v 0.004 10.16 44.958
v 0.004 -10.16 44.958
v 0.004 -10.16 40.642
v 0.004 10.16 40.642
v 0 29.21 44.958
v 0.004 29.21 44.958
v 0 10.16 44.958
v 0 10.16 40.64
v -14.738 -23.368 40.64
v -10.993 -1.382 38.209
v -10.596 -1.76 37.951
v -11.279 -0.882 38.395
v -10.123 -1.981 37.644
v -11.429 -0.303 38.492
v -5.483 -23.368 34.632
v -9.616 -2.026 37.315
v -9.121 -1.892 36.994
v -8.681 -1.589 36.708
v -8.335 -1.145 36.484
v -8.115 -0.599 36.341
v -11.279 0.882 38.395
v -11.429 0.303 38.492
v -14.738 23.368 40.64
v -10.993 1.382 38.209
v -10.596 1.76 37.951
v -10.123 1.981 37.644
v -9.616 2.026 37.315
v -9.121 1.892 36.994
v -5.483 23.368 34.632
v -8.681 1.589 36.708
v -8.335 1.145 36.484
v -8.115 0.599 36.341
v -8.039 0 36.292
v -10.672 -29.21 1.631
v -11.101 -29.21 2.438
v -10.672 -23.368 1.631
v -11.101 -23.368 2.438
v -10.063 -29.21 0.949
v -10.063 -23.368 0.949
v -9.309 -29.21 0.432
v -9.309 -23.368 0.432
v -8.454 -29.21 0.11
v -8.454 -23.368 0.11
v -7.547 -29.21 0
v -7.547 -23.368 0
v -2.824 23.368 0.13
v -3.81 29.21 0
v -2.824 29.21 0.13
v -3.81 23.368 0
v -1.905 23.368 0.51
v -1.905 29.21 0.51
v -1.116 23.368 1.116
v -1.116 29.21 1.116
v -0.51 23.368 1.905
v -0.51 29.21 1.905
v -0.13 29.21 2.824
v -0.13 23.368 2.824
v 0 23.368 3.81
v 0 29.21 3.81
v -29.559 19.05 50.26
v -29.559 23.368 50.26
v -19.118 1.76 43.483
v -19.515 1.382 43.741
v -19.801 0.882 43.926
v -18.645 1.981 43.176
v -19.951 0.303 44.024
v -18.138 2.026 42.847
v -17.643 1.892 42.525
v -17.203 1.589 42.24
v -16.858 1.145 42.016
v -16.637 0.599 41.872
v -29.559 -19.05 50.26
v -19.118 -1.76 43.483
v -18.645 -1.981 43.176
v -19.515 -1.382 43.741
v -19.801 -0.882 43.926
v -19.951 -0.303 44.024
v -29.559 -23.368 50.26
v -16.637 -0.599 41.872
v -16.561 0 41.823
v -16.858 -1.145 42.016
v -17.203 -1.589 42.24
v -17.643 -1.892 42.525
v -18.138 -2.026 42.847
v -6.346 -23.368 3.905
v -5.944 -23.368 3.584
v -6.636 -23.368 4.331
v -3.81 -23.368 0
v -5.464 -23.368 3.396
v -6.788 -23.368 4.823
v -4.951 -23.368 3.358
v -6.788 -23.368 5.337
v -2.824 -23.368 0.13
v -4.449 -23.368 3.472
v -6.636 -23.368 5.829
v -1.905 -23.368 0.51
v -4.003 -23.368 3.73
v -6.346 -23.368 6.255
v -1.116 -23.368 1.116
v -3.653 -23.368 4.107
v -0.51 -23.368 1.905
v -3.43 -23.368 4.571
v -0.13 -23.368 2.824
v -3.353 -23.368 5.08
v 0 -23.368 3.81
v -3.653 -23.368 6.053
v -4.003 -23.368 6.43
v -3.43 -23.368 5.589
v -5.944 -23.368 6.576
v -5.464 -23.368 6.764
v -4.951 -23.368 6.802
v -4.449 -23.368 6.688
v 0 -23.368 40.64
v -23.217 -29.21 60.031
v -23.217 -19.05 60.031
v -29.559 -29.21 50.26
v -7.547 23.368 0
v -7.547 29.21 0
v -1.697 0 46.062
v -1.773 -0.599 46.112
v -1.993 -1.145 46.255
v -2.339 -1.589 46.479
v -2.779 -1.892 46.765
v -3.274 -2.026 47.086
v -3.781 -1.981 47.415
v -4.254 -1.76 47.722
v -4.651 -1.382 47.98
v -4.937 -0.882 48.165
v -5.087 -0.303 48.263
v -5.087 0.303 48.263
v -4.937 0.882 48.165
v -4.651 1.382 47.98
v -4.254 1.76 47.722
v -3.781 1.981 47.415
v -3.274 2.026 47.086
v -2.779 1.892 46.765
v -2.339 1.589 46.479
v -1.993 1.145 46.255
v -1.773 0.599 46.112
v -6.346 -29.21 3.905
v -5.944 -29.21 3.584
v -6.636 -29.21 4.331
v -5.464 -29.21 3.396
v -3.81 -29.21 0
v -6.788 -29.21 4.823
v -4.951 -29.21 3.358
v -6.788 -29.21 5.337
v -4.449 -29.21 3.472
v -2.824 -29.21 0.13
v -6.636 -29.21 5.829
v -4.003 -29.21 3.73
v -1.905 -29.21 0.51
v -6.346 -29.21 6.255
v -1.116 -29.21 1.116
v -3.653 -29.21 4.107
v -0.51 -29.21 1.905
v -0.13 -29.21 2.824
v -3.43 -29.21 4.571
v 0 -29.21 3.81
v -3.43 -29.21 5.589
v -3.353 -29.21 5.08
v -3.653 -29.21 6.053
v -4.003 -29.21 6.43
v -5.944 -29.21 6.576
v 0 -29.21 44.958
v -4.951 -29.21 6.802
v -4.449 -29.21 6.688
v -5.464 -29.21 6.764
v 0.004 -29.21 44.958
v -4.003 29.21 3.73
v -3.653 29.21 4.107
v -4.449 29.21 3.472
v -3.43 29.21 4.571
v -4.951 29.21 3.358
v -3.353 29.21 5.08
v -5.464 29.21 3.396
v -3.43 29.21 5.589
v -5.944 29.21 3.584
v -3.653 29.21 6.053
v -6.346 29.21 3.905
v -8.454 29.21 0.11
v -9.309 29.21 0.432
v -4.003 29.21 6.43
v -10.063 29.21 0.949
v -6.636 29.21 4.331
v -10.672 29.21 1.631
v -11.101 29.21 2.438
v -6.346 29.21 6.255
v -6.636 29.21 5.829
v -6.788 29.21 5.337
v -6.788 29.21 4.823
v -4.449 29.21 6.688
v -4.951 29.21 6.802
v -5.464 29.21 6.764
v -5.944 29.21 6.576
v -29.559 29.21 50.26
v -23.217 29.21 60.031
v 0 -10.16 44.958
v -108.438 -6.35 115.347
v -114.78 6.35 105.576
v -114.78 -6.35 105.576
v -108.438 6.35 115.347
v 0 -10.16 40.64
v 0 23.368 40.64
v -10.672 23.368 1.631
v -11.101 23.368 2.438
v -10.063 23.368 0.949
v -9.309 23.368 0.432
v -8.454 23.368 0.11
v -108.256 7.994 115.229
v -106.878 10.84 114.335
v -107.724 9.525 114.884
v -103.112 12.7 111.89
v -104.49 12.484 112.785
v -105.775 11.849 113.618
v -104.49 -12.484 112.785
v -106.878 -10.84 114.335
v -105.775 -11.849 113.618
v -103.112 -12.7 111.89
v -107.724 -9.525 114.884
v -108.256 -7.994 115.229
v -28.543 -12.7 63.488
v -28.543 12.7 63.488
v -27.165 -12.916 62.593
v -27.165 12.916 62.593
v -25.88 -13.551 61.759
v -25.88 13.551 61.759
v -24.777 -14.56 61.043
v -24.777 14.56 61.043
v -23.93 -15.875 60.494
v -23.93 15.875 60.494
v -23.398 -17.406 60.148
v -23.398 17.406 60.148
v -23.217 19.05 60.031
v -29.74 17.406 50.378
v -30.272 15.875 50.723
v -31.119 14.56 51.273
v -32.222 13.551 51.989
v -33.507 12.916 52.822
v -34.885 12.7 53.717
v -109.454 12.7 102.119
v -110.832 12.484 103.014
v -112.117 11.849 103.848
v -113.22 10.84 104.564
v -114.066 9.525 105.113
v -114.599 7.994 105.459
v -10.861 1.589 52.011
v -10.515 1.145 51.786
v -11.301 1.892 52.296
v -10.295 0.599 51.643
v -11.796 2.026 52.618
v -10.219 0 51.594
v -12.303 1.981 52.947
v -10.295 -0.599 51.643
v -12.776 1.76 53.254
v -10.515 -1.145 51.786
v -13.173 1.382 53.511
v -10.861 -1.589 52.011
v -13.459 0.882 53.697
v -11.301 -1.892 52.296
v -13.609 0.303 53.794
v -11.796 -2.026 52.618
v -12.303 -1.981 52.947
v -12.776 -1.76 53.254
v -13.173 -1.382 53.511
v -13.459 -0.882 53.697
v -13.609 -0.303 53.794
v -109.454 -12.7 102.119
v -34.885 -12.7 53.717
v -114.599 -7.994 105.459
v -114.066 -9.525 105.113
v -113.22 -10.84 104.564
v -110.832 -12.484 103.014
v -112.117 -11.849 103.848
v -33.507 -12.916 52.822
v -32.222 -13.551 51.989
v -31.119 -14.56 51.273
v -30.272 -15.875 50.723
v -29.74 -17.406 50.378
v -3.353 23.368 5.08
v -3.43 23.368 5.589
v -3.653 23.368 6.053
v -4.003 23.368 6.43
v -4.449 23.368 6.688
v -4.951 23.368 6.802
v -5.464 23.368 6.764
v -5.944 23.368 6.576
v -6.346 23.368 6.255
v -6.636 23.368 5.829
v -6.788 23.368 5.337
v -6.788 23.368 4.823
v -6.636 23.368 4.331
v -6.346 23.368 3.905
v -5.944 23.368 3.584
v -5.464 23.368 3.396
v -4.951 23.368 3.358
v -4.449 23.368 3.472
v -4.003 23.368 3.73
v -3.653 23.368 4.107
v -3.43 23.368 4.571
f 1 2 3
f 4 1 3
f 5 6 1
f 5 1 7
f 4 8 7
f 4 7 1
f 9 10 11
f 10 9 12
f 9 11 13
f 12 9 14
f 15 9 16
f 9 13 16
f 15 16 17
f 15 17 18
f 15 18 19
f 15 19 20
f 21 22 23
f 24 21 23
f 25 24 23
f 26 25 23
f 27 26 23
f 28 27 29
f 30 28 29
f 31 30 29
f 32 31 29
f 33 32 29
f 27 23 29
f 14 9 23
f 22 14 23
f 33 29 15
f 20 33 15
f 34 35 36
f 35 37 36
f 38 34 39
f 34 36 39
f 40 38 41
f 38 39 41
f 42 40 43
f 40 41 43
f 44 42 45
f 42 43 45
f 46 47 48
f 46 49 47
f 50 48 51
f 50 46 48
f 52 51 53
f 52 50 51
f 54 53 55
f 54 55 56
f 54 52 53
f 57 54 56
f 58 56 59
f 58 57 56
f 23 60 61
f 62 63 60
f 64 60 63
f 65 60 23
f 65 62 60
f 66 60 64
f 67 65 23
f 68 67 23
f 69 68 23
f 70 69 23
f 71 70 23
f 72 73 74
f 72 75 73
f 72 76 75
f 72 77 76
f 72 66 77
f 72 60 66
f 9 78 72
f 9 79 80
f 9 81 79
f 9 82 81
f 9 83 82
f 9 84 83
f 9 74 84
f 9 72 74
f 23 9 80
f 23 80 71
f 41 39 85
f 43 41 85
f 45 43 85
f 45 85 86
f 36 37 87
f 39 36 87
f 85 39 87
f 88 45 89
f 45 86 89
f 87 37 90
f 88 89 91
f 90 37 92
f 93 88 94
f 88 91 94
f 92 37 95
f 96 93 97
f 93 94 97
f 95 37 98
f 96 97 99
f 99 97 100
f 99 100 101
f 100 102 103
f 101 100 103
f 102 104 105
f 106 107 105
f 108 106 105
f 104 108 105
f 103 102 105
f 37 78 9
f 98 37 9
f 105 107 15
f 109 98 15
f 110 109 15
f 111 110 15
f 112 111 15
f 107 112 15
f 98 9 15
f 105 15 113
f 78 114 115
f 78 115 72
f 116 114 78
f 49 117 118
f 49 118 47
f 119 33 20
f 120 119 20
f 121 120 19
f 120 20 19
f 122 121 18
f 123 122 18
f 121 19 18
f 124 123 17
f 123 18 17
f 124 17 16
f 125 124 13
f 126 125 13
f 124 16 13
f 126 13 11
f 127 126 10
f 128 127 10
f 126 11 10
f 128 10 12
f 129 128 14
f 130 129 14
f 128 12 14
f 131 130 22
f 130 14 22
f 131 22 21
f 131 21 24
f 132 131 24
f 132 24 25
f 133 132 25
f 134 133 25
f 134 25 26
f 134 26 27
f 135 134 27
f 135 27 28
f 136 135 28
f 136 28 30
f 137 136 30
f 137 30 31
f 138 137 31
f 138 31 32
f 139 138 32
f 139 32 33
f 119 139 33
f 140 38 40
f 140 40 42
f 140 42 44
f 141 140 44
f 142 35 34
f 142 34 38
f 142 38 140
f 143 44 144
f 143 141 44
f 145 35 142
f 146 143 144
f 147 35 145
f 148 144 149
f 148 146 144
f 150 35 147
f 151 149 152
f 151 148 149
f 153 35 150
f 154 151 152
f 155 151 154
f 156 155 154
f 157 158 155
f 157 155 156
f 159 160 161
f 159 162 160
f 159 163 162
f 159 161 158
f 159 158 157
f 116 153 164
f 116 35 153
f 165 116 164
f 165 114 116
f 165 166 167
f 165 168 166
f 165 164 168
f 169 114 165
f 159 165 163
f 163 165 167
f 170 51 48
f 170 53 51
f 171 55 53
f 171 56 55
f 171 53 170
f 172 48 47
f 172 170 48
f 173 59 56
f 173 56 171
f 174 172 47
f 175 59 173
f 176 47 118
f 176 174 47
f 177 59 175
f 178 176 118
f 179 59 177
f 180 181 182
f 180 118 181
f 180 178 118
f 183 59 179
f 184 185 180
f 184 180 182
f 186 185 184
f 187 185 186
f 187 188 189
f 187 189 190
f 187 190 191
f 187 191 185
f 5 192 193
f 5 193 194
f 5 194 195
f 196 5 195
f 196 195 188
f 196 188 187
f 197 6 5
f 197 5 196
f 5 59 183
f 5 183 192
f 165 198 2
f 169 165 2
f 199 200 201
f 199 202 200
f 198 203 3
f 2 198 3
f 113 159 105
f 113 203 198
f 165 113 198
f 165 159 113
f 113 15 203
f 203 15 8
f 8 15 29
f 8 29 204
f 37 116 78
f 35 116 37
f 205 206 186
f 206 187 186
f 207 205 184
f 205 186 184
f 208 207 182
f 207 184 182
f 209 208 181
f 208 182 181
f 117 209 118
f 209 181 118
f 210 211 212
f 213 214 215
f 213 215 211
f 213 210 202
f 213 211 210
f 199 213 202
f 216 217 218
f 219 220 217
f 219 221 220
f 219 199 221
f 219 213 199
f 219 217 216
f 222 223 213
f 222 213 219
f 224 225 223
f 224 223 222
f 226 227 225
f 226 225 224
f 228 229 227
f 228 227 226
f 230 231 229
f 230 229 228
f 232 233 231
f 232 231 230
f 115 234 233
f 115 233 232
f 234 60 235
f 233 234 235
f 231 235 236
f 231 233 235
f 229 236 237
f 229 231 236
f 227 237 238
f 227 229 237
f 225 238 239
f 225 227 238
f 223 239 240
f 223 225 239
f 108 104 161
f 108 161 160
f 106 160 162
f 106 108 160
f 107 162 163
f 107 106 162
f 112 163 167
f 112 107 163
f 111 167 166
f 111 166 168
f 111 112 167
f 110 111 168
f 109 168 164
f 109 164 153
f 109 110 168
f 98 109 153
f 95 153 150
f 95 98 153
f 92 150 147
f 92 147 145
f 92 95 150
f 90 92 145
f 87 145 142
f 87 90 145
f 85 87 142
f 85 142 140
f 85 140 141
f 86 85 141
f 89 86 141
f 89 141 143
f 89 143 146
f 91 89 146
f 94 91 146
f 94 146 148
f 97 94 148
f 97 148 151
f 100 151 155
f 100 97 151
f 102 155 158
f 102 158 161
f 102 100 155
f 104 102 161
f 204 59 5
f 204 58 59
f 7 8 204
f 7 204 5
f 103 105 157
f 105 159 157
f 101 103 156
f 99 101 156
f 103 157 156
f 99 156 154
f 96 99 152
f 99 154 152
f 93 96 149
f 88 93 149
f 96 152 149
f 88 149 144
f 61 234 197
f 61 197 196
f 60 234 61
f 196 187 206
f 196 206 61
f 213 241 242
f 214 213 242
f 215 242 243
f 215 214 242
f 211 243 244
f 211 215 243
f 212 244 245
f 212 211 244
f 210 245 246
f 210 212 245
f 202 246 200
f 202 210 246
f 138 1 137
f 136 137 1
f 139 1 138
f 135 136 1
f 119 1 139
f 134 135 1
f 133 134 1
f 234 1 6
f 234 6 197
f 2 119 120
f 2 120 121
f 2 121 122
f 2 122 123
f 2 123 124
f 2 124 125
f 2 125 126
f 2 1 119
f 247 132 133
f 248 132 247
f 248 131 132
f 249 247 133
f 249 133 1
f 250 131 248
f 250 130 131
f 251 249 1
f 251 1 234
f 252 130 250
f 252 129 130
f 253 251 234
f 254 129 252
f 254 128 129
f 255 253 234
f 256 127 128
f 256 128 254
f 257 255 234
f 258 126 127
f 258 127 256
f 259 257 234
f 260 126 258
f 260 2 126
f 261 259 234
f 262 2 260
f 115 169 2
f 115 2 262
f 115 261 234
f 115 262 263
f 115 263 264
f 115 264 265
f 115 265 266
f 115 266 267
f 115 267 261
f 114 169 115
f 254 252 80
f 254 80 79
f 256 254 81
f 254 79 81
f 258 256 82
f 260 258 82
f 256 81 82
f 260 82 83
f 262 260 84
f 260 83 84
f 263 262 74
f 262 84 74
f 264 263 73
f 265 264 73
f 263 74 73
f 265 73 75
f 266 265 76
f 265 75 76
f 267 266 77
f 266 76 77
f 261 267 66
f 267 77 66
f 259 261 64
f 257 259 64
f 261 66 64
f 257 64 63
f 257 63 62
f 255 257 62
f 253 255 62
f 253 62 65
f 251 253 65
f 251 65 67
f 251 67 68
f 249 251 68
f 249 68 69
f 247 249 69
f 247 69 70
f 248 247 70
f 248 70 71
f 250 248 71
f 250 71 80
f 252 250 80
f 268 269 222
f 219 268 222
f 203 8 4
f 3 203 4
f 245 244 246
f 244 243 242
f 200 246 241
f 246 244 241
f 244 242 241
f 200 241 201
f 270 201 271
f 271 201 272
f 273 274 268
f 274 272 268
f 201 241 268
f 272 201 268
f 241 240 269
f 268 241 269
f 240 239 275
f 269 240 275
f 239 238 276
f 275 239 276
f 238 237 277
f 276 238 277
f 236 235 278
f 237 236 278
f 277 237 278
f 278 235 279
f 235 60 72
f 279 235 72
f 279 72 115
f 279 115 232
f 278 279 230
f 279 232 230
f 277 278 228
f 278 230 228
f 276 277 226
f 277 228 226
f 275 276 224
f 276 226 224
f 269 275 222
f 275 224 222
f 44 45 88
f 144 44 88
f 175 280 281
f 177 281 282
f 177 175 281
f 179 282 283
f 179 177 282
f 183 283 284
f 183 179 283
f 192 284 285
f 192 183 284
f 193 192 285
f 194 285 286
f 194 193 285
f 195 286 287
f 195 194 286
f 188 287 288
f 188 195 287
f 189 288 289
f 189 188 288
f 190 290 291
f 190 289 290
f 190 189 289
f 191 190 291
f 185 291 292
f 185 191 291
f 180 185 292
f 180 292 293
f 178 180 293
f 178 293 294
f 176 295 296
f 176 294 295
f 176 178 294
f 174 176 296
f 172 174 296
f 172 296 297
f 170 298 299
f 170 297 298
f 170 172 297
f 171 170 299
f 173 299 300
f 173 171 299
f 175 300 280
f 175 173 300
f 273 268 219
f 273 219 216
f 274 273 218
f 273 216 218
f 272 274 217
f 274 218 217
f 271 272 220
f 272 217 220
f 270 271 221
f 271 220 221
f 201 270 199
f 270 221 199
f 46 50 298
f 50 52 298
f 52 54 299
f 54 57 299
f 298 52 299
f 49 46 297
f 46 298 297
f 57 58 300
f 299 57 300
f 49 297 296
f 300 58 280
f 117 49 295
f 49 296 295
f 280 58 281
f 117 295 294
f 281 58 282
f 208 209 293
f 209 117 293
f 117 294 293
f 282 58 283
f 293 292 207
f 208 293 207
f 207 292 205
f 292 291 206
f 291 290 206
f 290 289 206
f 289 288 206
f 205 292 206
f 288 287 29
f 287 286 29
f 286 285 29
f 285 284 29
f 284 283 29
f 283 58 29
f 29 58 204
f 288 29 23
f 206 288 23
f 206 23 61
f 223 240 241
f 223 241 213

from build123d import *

# Parameters (mm, degrees)
F0_R      = 1.7272
F1_DEPTH  = 29.21
F2_W      = 46.736
F2_H      = 40.64
F3_DEPTH  = 25.4
F4_W      = 15.24
F4_H      = 6.35
F5_DEPTH  = 19.05
F6_W      = 15.24
F6_H      = 6.35
F7_DEPTH  = 19.05
F9_DEPTH  = 20.32
F11_DEPTH = 10.16
F12_SIZE2 = 0.8244325429
F12_SIZE  = 1.27
F13_W     = 25.4
F13_H     = 11.6485927218
F14_DEPTH = 101.6
F15_R     = 2.54
F16_R     = 6.35
F17_R     = 0.79502
F19_DEPTH = 5.842
F21_DEPTH = 5.842
F22_R     = 3.81
F24_DEPTH = 25.4
F26_DEPTH = 46.736
F27_R     = 2.032
F28_DEPTH = 70.6913527338


with BuildPart() as f1:
    # F0 (on Front) → F1 (new body, symmetric)
    with BuildSketch(Plane.XZ):
        Polygon((-10.16, 0), (0, 0), (0, 29.21), (0, 41.8084), (6.35, 41.8084), (6.35, 39.878), (10.16, 39.878), (12.7, 44.958), (0.0042528918, 44.958), (-10.16, 44.958), (-10.16, 37.6681894868), align=None)
        with Locations((-5.08, 5.08)):
            Circle(F0_R, mode=Mode.SUBTRACT)
        Polygon((-29.558896087, 50.2598920283), (-10.16, 37.6681894868), (-10.16, 44.958), (0.0042528918, 44.958), (-23.2167746872, 60.0306242704), align=None)
    extrude(amount=F1_DEPTH, both=True)

    # F2 (on face) → F3 (cut)
    with BuildSketch(Plane.YZ):
        with Locations((0, 20.32)):
            Rectangle(F2_W, F2_H)
    extrude(amount=-F3_DEPTH, mode=Mode.SUBTRACT)

    # F4 (on face) → F5 (cut)
    with BuildSketch(Plane(origin=(0, 29.21, 0), x_dir=(-1, 0, 0), z_dir=(0, 1, 0))):
        with Locations((-7.62, 41.783)):
            Rectangle(F4_W, F4_H)
    extrude(amount=-F5_DEPTH, mode=Mode.SUBTRACT)

    # F6 (on face) → F7 (cut)
    with BuildSketch(Plane.XZ.offset(29.21)):
        with Locations((7.62, 41.783)):
            Rectangle(F6_W, F6_H)
    extrude(amount=-F7_DEPTH, mode=Mode.SUBTRACT)

    # F8 (on face) → F9 (join)
    with BuildSketch(Plane.XZ.offset(10.16)):
        Polygon((2.8191059828, 41.8084), (0, 41.8084), (0, 40.64), align=None)
    extrude(amount=-F9_DEPTH)

    # F10 (on Front) → F11 (join, symmetric)
    with BuildSketch(Plane.XZ):
        Polygon((0.0042528918, 44.958), (12.7, 44.958), (-13.1833395176, 61.7587143563), (-16.9467400578, 55.9607838721), align=None)
    extrude(amount=F11_DEPTH, both=True)

    # F12
    f12_edges = [f1.edges().sort_by_distance(p)[0] for p in [
        (6.35, 0, 39.878),
    ]]
    f12_side = f1.faces().sort_by_distance((8.255, 0, 39.878))[0]
    chamfer(f12_edges, length=F12_SIZE, length2=F12_SIZE2, reference=f12_side)

    # F13 (on face) → F14 (join)
    with BuildSketch(Plane(origin=(-43.749584755, 0, 28.3975827839), x_dir=(0, -1, 0), z_dir=(-0.8387907858, 0, 0.5444538711))):
        with Locations((0, 31.888375289)):
            Rectangle(F13_W, F13_H)
    extrude(amount=F14_DEPTH)

    # F15
    f15_edges = [f1.edges().sort_by_distance(p)[0] for p in [
        (-13.18334, 0, 61.758714),
    ]]
    fillet(f15_edges, radius=F15_R)

    # F16
    f16_edges = [f1.edges().sort_by_distance(p)[0] for p in [
        (-26.387835, -12.7, 55.145258),
        (-26.387835, 12.7, 55.145258),
        (-111.608979, 12.7, 110.461771),
        (-111.608979, -12.7, 110.461771),
    ]]
    fillet(f16_edges, radius=F16_R)

    # F17
    f17_edges = [f1.edges().sort_by_distance(p)[0] for p in [
        (6.35, 0, 41.8084),
    ]]
    fillet(f17_edges, radius=F17_R)

    # F18 (on face) → F19 (join)
    with BuildSketch(Plane.XZ.offset(29.21)):
        Polygon((-10.16, 37.6681894868), (-29.558896087, 50.2598920283), (-10.16, 0), align=None)
    extrude(amount=-F19_DEPTH)

    # F20 (on face) → F21 (join)
    with BuildSketch(Plane(origin=(0, 29.21, 0), x_dir=(-1, 0, 0), z_dir=(0, 1, 0))):
        Polygon((10.16, 0), (29.558896087, 50.2598920283), (10.16, 37.6681894868), align=None)
    extrude(amount=-F21_DEPTH)

    # F22
    f22_edges = [f1.edges().sort_by_distance(p)[0] for p in [
        (0, -26.289, 0),
        (0, 26.289, 0),
        (-10.16, -26.289, 0),
        (-10.16, 26.289, 0),
    ]]
    fillet(f22_edges, radius=F22_R)

    # F23 (on face) → F24 (cut)
    with BuildSketch(Plane.XZ.offset(10.16)):
        with BuildLine():
            Line((-12.2835052774, 63.1450075017), (-14.5662523501, 59.6281857605))
            ThreePointArc((-14.5662523501, 59.6281857605), (-12.9643679303, 60.7296511872), (-11.0528109218, 60.3758015238))
            Line((-11.0528109218, 60.3758015238), (12.7, 44.958))
            Line((12.7, 44.958), (10.16, 39.878))
            Line((10.16, 39.878), (7.62, 39.878))
            Line((7.62, 39.878), (6.35, 40.7024325429))
            Line((6.35, 40.7024325429), (6.35, 41.01338))
            ThreePointArc((6.35, 41.01338), (6.1171440332, 41.5755440332), (5.55498, 41.8084))
            Line((5.55498, 41.8084), (2.8191059828, 41.8084))
            Line((2.8191059828, 41.8084), (0.0042528918, 40.6417626435))
            Line((0.0042528918, 40.6417626435), (0.0042528918, 37.8040261567))
            Line((0.0042528918, 37.8040261567), (17.359075731, 37.8040261567))
            Line((17.359075731, 37.8040261567), (17.359075731, 44.7986531364))
            Line((17.359075731, 44.7986531364), (-12.2835052774, 63.1450075017))
        make_face()
        with BuildLine():
            Line((-14.5662523501, 59.6281857605), (-16.9467400578, 55.9607838721))
            Line((-16.9467400578, 55.9607838721), (0.0042528918, 44.958))
            Line((0.0042528918, 44.958), (0.0042528918, 40.6417626435))
            Line((0.0042528918, 40.6417626435), (2.8191059828, 41.8084))
            Line((2.8191059828, 41.8084), (5.55498, 41.8084))
            ThreePointArc((5.55498, 41.8084), (6.1171440332, 41.5755440332), (6.35, 41.01338))
            Line((6.35, 41.01338), (6.35, 40.7024325429))
            Line((6.35, 40.7024325429), (7.62, 39.878))
            Line((7.62, 39.878), (10.16, 39.878))
            Line((10.16, 39.878), (12.7, 44.958))
            Line((12.7, 44.958), (-11.0528109218, 60.3758015238))
            ThreePointArc((-11.0528109218, 60.3758015238), (-12.9643679303, 60.7296511872), (-14.5662523501, 59.6281857605))
        make_face()
    extrude(amount=-F24_DEPTH, mode=Mode.SUBTRACT)

    # F25 (on face) → F26 (join)
    with BuildSketch(Plane.XZ.offset(-23.368)):
        Polygon((0, 40.64), (-14.738399398, 40.64), (-5.4826612016, 34.6321580255), align=None)
    extrude(amount=F26_DEPTH)

    # F27 (on face) → F28 (cut, through all)
    with BuildSketch(Plane(origin=(14.190688668, 0, 21.8623092444), x_dir=(0.8387907858, 0, -0.5444538711), z_dir=(-0.5444538711, 0, -0.8387907858))):
        with Locations((-28.5344181975, 0)):
            Circle(F27_R)
        with Locations((-38.6944181975, 0)):
            Circle(F27_R)
    extrude(amount=-F28_DEPTH, mode=Mode.SUBTRACT)


solid = f1.part
